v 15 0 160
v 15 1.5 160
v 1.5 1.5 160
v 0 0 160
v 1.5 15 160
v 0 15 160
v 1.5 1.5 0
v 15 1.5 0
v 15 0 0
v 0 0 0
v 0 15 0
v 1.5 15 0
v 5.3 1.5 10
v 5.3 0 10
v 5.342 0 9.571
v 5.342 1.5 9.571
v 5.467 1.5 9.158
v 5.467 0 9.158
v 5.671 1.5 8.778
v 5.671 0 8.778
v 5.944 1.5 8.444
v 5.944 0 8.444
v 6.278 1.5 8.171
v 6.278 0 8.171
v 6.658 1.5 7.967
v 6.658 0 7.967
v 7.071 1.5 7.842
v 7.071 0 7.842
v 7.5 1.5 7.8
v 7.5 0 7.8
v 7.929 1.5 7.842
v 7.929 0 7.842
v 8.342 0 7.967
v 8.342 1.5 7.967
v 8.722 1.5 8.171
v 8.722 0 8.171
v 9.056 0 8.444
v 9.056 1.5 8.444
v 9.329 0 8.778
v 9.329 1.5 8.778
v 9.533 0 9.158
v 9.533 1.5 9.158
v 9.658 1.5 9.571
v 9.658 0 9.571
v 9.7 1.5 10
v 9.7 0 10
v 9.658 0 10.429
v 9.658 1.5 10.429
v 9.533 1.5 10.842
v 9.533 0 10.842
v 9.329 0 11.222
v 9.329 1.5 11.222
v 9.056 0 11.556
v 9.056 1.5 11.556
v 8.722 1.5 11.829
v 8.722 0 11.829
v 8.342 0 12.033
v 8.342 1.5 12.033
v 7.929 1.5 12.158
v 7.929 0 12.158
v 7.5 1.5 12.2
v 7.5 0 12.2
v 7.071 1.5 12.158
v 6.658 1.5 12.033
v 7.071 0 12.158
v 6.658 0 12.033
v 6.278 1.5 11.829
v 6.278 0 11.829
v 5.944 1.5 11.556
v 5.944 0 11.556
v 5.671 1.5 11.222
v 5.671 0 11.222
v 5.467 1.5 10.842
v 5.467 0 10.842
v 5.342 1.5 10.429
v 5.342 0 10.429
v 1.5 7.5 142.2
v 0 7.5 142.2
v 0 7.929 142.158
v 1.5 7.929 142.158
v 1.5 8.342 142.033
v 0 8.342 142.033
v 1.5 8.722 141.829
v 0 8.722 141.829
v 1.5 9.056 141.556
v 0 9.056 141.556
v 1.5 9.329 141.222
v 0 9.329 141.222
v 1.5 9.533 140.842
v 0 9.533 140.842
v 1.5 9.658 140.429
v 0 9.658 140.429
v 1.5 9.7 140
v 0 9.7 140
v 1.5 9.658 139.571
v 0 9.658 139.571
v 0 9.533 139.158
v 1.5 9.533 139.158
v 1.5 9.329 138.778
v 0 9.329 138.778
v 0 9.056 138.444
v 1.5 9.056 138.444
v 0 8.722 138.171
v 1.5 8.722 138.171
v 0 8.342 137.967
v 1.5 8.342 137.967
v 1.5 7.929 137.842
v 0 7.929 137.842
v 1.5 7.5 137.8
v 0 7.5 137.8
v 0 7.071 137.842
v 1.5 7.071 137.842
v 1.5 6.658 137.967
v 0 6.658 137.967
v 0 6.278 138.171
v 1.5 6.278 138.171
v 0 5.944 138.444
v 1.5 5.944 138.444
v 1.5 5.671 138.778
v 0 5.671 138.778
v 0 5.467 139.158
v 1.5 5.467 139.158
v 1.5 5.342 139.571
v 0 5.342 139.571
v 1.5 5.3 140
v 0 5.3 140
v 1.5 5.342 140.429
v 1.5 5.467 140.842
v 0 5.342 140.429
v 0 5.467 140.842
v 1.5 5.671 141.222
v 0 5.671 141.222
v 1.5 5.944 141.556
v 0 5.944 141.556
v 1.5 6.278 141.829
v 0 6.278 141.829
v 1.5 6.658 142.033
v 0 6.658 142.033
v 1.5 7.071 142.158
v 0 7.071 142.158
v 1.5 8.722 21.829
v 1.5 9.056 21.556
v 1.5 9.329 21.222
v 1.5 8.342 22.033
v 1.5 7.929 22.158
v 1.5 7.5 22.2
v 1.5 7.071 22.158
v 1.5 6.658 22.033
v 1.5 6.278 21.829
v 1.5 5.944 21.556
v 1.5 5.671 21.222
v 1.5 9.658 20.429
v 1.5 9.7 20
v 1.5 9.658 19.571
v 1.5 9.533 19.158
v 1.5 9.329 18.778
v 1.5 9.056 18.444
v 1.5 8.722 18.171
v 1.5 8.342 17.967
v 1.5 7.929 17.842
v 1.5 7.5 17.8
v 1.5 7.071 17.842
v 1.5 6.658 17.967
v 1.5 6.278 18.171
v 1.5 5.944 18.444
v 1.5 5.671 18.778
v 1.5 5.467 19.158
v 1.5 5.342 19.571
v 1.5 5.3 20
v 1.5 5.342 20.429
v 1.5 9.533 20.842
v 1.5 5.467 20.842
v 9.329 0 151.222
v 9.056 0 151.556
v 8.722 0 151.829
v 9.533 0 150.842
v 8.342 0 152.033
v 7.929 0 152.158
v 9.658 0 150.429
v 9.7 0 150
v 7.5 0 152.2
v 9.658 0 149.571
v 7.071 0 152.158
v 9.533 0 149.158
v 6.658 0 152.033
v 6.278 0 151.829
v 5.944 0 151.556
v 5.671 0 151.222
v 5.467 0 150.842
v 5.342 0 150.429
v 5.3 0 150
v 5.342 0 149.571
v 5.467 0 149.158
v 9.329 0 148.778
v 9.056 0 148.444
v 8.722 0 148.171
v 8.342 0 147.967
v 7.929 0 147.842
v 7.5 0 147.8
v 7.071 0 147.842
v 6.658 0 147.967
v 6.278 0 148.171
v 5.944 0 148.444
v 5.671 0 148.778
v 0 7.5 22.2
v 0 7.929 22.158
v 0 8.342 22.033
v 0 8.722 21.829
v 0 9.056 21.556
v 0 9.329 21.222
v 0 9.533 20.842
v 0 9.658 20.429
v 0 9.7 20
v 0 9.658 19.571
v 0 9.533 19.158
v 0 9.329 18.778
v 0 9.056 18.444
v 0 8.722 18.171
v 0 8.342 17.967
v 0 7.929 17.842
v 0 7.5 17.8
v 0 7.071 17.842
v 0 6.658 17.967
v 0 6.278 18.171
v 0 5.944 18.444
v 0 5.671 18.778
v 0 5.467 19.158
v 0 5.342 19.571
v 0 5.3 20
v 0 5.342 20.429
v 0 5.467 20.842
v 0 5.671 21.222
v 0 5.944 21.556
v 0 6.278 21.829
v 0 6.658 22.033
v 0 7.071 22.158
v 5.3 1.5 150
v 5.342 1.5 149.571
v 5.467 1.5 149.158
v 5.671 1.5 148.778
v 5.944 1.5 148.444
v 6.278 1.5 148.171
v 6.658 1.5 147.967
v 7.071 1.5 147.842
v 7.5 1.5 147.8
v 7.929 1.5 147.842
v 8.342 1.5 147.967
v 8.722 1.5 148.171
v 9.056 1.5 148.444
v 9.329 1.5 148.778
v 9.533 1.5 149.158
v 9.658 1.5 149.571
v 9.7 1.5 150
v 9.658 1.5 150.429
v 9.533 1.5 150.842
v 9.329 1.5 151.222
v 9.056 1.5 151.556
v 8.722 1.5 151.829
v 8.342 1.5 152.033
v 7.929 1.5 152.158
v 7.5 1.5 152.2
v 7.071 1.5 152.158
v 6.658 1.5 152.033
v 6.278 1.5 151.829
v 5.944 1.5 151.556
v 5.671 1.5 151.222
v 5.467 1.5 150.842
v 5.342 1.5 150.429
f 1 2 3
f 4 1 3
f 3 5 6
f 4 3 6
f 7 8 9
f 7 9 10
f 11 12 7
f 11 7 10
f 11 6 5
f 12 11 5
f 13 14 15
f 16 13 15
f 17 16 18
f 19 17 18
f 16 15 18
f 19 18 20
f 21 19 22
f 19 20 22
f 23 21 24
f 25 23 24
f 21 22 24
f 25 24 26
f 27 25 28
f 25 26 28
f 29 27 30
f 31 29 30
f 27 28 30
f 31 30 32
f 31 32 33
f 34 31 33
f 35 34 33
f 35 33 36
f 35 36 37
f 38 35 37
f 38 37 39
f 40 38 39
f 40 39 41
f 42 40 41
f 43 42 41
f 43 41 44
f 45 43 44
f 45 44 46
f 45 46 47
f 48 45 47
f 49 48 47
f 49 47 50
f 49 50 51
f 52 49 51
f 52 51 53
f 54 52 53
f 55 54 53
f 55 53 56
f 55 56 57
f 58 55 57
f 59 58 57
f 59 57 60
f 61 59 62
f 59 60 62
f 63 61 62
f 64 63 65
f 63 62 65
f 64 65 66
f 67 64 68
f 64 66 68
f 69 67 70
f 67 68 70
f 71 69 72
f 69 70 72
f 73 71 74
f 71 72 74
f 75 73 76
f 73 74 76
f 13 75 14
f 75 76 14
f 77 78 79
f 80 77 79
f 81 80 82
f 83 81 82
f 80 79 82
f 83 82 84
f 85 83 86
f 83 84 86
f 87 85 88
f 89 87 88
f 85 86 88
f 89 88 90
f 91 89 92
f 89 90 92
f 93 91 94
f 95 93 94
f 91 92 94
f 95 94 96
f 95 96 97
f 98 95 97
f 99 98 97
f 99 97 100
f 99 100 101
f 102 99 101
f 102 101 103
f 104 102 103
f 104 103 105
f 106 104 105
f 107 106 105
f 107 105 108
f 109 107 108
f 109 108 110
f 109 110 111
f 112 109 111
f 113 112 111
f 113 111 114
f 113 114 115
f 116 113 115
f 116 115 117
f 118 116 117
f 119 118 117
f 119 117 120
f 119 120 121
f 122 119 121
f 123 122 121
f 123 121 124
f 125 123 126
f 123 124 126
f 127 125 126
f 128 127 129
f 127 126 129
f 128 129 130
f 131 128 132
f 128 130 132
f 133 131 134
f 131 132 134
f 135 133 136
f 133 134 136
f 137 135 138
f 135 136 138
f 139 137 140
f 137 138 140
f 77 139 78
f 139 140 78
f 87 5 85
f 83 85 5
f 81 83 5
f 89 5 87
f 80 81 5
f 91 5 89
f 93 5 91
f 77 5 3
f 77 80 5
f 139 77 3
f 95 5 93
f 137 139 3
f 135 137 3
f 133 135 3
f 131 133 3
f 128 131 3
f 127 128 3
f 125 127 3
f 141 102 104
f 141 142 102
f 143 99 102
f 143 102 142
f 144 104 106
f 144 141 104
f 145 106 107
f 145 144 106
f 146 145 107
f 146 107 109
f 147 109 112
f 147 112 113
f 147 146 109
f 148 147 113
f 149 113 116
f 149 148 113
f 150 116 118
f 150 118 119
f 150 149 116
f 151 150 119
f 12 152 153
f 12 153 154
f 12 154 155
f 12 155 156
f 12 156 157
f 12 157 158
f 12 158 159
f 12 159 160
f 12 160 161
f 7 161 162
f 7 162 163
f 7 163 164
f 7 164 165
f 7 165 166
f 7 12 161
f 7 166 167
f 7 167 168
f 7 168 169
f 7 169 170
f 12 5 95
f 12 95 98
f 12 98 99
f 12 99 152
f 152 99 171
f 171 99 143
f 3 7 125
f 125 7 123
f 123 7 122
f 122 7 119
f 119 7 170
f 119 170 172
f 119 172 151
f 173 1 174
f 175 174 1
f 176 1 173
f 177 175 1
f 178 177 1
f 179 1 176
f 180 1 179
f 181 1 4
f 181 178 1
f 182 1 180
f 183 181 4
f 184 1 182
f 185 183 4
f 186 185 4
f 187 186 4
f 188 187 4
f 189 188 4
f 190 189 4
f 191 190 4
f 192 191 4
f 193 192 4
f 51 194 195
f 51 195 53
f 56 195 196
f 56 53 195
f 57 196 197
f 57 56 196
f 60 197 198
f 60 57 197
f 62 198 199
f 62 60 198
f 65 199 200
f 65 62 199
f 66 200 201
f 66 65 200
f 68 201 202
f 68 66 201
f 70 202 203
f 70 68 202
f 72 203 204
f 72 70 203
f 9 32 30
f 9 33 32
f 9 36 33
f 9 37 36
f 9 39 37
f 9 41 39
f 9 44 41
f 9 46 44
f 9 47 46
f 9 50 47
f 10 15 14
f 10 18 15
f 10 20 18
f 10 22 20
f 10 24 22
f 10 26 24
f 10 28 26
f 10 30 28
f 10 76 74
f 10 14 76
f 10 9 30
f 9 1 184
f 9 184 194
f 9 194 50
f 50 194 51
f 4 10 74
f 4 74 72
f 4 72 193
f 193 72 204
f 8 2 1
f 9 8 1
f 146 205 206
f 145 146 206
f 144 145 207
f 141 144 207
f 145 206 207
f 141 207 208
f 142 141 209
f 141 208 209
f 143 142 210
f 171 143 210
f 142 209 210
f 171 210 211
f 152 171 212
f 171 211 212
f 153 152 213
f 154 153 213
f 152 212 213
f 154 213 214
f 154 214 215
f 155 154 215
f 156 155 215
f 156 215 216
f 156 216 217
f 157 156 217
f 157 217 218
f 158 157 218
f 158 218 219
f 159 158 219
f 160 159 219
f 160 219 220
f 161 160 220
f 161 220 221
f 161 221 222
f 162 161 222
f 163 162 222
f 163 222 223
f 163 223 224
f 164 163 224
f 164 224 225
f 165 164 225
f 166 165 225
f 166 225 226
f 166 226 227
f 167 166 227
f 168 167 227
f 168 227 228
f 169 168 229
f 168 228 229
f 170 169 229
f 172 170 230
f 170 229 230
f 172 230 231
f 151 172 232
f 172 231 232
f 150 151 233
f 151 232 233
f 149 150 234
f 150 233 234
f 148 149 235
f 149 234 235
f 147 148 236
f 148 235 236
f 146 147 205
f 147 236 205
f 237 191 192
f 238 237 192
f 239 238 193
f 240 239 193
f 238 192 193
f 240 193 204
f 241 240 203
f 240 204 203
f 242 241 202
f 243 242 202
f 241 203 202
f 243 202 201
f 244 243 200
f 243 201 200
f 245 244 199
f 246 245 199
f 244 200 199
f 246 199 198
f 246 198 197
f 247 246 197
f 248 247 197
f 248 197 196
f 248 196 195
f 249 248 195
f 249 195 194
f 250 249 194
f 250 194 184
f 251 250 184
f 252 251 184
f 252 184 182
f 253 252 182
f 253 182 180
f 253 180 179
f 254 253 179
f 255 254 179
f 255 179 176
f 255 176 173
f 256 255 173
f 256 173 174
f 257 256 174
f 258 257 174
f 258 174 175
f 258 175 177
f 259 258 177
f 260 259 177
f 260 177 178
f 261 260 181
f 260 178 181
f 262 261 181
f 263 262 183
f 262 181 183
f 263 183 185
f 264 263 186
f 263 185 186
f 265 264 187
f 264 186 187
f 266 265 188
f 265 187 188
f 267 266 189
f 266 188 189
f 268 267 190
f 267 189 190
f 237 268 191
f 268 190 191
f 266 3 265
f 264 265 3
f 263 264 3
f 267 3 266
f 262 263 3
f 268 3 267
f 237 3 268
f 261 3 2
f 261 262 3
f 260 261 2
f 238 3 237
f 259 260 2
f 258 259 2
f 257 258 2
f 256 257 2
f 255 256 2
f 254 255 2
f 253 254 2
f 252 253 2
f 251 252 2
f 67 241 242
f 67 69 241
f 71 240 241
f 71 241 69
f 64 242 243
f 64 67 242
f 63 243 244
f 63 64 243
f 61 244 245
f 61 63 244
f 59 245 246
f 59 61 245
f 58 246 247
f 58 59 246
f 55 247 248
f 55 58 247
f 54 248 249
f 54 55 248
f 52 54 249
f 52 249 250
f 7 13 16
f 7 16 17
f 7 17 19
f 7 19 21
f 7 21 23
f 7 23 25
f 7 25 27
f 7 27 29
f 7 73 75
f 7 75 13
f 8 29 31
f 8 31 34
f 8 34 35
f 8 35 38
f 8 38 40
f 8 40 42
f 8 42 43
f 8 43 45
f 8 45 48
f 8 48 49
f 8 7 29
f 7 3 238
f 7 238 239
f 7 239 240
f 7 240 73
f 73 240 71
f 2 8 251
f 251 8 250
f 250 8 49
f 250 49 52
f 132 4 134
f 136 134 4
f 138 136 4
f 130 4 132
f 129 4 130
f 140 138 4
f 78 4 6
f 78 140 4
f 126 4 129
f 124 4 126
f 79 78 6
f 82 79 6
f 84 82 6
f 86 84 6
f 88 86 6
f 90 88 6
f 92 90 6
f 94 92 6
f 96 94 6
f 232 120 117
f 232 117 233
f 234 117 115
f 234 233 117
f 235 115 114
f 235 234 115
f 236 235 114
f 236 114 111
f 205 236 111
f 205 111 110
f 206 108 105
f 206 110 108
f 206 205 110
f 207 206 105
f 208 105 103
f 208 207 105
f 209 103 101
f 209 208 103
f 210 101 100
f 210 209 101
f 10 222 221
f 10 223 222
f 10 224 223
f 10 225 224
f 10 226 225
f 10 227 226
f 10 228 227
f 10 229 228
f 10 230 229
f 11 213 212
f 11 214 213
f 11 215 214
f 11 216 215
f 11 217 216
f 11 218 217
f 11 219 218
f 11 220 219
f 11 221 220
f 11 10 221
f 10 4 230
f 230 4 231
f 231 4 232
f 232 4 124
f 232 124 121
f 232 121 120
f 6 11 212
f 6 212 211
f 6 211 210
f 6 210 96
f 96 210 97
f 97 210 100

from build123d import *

# Parameters (mm, degrees)
EXTRUDE_1_DEPTH     = 160
SKETCH_2_R          = 2.2
CUT_EXTRUDE_1_DEPTH = 16
SKETCH_3_R          = 2.2
CUT_EXTRUDE_2_DEPTH = 160


with BuildPart() as part:
    # ｽｹｯﾁ1 → ﾎﾞｽ - 押し出し1 (new body)
    with BuildSketch(Plane.XY):
        Polygon((0, 0), (0, 15), (1.5, 15), (1.5, 1.5), (15, 1.5), (15, 0), align=None)
    extrude(amount=EXTRUDE_1_DEPTH)

    # ｽｹｯﾁ2 → ｶｯﾄ - 押し出し1 (cut, through all)
    with BuildSketch(Plane.ZY):
        with Locations((20, 7.5)):
            Circle(SKETCH_2_R)
        with Locations((140, 7.5)):
            Circle(SKETCH_2_R)
    extrude(amount=-CUT_EXTRUDE_1_DEPTH, mode=Mode.SUBTRACT)

    # ｽｹｯﾁ3 → ｶｯﾄ - 押し出し2 (cut)
    with BuildSketch(Plane(origin=(0, 0, 0), x_dir=(-1, 0, 0), z_dir=(0, -1, 0))):
        with Locations((-7.5, -10)):
            Circle(SKETCH_3_R)
        with Locations((-7.5, -150)):
            Circle(SKETCH_3_R)
    extrude(amount=-CUT_EXTRUDE_2_DEPTH, mode=Mode.SUBTRACT)


solid = part.part
